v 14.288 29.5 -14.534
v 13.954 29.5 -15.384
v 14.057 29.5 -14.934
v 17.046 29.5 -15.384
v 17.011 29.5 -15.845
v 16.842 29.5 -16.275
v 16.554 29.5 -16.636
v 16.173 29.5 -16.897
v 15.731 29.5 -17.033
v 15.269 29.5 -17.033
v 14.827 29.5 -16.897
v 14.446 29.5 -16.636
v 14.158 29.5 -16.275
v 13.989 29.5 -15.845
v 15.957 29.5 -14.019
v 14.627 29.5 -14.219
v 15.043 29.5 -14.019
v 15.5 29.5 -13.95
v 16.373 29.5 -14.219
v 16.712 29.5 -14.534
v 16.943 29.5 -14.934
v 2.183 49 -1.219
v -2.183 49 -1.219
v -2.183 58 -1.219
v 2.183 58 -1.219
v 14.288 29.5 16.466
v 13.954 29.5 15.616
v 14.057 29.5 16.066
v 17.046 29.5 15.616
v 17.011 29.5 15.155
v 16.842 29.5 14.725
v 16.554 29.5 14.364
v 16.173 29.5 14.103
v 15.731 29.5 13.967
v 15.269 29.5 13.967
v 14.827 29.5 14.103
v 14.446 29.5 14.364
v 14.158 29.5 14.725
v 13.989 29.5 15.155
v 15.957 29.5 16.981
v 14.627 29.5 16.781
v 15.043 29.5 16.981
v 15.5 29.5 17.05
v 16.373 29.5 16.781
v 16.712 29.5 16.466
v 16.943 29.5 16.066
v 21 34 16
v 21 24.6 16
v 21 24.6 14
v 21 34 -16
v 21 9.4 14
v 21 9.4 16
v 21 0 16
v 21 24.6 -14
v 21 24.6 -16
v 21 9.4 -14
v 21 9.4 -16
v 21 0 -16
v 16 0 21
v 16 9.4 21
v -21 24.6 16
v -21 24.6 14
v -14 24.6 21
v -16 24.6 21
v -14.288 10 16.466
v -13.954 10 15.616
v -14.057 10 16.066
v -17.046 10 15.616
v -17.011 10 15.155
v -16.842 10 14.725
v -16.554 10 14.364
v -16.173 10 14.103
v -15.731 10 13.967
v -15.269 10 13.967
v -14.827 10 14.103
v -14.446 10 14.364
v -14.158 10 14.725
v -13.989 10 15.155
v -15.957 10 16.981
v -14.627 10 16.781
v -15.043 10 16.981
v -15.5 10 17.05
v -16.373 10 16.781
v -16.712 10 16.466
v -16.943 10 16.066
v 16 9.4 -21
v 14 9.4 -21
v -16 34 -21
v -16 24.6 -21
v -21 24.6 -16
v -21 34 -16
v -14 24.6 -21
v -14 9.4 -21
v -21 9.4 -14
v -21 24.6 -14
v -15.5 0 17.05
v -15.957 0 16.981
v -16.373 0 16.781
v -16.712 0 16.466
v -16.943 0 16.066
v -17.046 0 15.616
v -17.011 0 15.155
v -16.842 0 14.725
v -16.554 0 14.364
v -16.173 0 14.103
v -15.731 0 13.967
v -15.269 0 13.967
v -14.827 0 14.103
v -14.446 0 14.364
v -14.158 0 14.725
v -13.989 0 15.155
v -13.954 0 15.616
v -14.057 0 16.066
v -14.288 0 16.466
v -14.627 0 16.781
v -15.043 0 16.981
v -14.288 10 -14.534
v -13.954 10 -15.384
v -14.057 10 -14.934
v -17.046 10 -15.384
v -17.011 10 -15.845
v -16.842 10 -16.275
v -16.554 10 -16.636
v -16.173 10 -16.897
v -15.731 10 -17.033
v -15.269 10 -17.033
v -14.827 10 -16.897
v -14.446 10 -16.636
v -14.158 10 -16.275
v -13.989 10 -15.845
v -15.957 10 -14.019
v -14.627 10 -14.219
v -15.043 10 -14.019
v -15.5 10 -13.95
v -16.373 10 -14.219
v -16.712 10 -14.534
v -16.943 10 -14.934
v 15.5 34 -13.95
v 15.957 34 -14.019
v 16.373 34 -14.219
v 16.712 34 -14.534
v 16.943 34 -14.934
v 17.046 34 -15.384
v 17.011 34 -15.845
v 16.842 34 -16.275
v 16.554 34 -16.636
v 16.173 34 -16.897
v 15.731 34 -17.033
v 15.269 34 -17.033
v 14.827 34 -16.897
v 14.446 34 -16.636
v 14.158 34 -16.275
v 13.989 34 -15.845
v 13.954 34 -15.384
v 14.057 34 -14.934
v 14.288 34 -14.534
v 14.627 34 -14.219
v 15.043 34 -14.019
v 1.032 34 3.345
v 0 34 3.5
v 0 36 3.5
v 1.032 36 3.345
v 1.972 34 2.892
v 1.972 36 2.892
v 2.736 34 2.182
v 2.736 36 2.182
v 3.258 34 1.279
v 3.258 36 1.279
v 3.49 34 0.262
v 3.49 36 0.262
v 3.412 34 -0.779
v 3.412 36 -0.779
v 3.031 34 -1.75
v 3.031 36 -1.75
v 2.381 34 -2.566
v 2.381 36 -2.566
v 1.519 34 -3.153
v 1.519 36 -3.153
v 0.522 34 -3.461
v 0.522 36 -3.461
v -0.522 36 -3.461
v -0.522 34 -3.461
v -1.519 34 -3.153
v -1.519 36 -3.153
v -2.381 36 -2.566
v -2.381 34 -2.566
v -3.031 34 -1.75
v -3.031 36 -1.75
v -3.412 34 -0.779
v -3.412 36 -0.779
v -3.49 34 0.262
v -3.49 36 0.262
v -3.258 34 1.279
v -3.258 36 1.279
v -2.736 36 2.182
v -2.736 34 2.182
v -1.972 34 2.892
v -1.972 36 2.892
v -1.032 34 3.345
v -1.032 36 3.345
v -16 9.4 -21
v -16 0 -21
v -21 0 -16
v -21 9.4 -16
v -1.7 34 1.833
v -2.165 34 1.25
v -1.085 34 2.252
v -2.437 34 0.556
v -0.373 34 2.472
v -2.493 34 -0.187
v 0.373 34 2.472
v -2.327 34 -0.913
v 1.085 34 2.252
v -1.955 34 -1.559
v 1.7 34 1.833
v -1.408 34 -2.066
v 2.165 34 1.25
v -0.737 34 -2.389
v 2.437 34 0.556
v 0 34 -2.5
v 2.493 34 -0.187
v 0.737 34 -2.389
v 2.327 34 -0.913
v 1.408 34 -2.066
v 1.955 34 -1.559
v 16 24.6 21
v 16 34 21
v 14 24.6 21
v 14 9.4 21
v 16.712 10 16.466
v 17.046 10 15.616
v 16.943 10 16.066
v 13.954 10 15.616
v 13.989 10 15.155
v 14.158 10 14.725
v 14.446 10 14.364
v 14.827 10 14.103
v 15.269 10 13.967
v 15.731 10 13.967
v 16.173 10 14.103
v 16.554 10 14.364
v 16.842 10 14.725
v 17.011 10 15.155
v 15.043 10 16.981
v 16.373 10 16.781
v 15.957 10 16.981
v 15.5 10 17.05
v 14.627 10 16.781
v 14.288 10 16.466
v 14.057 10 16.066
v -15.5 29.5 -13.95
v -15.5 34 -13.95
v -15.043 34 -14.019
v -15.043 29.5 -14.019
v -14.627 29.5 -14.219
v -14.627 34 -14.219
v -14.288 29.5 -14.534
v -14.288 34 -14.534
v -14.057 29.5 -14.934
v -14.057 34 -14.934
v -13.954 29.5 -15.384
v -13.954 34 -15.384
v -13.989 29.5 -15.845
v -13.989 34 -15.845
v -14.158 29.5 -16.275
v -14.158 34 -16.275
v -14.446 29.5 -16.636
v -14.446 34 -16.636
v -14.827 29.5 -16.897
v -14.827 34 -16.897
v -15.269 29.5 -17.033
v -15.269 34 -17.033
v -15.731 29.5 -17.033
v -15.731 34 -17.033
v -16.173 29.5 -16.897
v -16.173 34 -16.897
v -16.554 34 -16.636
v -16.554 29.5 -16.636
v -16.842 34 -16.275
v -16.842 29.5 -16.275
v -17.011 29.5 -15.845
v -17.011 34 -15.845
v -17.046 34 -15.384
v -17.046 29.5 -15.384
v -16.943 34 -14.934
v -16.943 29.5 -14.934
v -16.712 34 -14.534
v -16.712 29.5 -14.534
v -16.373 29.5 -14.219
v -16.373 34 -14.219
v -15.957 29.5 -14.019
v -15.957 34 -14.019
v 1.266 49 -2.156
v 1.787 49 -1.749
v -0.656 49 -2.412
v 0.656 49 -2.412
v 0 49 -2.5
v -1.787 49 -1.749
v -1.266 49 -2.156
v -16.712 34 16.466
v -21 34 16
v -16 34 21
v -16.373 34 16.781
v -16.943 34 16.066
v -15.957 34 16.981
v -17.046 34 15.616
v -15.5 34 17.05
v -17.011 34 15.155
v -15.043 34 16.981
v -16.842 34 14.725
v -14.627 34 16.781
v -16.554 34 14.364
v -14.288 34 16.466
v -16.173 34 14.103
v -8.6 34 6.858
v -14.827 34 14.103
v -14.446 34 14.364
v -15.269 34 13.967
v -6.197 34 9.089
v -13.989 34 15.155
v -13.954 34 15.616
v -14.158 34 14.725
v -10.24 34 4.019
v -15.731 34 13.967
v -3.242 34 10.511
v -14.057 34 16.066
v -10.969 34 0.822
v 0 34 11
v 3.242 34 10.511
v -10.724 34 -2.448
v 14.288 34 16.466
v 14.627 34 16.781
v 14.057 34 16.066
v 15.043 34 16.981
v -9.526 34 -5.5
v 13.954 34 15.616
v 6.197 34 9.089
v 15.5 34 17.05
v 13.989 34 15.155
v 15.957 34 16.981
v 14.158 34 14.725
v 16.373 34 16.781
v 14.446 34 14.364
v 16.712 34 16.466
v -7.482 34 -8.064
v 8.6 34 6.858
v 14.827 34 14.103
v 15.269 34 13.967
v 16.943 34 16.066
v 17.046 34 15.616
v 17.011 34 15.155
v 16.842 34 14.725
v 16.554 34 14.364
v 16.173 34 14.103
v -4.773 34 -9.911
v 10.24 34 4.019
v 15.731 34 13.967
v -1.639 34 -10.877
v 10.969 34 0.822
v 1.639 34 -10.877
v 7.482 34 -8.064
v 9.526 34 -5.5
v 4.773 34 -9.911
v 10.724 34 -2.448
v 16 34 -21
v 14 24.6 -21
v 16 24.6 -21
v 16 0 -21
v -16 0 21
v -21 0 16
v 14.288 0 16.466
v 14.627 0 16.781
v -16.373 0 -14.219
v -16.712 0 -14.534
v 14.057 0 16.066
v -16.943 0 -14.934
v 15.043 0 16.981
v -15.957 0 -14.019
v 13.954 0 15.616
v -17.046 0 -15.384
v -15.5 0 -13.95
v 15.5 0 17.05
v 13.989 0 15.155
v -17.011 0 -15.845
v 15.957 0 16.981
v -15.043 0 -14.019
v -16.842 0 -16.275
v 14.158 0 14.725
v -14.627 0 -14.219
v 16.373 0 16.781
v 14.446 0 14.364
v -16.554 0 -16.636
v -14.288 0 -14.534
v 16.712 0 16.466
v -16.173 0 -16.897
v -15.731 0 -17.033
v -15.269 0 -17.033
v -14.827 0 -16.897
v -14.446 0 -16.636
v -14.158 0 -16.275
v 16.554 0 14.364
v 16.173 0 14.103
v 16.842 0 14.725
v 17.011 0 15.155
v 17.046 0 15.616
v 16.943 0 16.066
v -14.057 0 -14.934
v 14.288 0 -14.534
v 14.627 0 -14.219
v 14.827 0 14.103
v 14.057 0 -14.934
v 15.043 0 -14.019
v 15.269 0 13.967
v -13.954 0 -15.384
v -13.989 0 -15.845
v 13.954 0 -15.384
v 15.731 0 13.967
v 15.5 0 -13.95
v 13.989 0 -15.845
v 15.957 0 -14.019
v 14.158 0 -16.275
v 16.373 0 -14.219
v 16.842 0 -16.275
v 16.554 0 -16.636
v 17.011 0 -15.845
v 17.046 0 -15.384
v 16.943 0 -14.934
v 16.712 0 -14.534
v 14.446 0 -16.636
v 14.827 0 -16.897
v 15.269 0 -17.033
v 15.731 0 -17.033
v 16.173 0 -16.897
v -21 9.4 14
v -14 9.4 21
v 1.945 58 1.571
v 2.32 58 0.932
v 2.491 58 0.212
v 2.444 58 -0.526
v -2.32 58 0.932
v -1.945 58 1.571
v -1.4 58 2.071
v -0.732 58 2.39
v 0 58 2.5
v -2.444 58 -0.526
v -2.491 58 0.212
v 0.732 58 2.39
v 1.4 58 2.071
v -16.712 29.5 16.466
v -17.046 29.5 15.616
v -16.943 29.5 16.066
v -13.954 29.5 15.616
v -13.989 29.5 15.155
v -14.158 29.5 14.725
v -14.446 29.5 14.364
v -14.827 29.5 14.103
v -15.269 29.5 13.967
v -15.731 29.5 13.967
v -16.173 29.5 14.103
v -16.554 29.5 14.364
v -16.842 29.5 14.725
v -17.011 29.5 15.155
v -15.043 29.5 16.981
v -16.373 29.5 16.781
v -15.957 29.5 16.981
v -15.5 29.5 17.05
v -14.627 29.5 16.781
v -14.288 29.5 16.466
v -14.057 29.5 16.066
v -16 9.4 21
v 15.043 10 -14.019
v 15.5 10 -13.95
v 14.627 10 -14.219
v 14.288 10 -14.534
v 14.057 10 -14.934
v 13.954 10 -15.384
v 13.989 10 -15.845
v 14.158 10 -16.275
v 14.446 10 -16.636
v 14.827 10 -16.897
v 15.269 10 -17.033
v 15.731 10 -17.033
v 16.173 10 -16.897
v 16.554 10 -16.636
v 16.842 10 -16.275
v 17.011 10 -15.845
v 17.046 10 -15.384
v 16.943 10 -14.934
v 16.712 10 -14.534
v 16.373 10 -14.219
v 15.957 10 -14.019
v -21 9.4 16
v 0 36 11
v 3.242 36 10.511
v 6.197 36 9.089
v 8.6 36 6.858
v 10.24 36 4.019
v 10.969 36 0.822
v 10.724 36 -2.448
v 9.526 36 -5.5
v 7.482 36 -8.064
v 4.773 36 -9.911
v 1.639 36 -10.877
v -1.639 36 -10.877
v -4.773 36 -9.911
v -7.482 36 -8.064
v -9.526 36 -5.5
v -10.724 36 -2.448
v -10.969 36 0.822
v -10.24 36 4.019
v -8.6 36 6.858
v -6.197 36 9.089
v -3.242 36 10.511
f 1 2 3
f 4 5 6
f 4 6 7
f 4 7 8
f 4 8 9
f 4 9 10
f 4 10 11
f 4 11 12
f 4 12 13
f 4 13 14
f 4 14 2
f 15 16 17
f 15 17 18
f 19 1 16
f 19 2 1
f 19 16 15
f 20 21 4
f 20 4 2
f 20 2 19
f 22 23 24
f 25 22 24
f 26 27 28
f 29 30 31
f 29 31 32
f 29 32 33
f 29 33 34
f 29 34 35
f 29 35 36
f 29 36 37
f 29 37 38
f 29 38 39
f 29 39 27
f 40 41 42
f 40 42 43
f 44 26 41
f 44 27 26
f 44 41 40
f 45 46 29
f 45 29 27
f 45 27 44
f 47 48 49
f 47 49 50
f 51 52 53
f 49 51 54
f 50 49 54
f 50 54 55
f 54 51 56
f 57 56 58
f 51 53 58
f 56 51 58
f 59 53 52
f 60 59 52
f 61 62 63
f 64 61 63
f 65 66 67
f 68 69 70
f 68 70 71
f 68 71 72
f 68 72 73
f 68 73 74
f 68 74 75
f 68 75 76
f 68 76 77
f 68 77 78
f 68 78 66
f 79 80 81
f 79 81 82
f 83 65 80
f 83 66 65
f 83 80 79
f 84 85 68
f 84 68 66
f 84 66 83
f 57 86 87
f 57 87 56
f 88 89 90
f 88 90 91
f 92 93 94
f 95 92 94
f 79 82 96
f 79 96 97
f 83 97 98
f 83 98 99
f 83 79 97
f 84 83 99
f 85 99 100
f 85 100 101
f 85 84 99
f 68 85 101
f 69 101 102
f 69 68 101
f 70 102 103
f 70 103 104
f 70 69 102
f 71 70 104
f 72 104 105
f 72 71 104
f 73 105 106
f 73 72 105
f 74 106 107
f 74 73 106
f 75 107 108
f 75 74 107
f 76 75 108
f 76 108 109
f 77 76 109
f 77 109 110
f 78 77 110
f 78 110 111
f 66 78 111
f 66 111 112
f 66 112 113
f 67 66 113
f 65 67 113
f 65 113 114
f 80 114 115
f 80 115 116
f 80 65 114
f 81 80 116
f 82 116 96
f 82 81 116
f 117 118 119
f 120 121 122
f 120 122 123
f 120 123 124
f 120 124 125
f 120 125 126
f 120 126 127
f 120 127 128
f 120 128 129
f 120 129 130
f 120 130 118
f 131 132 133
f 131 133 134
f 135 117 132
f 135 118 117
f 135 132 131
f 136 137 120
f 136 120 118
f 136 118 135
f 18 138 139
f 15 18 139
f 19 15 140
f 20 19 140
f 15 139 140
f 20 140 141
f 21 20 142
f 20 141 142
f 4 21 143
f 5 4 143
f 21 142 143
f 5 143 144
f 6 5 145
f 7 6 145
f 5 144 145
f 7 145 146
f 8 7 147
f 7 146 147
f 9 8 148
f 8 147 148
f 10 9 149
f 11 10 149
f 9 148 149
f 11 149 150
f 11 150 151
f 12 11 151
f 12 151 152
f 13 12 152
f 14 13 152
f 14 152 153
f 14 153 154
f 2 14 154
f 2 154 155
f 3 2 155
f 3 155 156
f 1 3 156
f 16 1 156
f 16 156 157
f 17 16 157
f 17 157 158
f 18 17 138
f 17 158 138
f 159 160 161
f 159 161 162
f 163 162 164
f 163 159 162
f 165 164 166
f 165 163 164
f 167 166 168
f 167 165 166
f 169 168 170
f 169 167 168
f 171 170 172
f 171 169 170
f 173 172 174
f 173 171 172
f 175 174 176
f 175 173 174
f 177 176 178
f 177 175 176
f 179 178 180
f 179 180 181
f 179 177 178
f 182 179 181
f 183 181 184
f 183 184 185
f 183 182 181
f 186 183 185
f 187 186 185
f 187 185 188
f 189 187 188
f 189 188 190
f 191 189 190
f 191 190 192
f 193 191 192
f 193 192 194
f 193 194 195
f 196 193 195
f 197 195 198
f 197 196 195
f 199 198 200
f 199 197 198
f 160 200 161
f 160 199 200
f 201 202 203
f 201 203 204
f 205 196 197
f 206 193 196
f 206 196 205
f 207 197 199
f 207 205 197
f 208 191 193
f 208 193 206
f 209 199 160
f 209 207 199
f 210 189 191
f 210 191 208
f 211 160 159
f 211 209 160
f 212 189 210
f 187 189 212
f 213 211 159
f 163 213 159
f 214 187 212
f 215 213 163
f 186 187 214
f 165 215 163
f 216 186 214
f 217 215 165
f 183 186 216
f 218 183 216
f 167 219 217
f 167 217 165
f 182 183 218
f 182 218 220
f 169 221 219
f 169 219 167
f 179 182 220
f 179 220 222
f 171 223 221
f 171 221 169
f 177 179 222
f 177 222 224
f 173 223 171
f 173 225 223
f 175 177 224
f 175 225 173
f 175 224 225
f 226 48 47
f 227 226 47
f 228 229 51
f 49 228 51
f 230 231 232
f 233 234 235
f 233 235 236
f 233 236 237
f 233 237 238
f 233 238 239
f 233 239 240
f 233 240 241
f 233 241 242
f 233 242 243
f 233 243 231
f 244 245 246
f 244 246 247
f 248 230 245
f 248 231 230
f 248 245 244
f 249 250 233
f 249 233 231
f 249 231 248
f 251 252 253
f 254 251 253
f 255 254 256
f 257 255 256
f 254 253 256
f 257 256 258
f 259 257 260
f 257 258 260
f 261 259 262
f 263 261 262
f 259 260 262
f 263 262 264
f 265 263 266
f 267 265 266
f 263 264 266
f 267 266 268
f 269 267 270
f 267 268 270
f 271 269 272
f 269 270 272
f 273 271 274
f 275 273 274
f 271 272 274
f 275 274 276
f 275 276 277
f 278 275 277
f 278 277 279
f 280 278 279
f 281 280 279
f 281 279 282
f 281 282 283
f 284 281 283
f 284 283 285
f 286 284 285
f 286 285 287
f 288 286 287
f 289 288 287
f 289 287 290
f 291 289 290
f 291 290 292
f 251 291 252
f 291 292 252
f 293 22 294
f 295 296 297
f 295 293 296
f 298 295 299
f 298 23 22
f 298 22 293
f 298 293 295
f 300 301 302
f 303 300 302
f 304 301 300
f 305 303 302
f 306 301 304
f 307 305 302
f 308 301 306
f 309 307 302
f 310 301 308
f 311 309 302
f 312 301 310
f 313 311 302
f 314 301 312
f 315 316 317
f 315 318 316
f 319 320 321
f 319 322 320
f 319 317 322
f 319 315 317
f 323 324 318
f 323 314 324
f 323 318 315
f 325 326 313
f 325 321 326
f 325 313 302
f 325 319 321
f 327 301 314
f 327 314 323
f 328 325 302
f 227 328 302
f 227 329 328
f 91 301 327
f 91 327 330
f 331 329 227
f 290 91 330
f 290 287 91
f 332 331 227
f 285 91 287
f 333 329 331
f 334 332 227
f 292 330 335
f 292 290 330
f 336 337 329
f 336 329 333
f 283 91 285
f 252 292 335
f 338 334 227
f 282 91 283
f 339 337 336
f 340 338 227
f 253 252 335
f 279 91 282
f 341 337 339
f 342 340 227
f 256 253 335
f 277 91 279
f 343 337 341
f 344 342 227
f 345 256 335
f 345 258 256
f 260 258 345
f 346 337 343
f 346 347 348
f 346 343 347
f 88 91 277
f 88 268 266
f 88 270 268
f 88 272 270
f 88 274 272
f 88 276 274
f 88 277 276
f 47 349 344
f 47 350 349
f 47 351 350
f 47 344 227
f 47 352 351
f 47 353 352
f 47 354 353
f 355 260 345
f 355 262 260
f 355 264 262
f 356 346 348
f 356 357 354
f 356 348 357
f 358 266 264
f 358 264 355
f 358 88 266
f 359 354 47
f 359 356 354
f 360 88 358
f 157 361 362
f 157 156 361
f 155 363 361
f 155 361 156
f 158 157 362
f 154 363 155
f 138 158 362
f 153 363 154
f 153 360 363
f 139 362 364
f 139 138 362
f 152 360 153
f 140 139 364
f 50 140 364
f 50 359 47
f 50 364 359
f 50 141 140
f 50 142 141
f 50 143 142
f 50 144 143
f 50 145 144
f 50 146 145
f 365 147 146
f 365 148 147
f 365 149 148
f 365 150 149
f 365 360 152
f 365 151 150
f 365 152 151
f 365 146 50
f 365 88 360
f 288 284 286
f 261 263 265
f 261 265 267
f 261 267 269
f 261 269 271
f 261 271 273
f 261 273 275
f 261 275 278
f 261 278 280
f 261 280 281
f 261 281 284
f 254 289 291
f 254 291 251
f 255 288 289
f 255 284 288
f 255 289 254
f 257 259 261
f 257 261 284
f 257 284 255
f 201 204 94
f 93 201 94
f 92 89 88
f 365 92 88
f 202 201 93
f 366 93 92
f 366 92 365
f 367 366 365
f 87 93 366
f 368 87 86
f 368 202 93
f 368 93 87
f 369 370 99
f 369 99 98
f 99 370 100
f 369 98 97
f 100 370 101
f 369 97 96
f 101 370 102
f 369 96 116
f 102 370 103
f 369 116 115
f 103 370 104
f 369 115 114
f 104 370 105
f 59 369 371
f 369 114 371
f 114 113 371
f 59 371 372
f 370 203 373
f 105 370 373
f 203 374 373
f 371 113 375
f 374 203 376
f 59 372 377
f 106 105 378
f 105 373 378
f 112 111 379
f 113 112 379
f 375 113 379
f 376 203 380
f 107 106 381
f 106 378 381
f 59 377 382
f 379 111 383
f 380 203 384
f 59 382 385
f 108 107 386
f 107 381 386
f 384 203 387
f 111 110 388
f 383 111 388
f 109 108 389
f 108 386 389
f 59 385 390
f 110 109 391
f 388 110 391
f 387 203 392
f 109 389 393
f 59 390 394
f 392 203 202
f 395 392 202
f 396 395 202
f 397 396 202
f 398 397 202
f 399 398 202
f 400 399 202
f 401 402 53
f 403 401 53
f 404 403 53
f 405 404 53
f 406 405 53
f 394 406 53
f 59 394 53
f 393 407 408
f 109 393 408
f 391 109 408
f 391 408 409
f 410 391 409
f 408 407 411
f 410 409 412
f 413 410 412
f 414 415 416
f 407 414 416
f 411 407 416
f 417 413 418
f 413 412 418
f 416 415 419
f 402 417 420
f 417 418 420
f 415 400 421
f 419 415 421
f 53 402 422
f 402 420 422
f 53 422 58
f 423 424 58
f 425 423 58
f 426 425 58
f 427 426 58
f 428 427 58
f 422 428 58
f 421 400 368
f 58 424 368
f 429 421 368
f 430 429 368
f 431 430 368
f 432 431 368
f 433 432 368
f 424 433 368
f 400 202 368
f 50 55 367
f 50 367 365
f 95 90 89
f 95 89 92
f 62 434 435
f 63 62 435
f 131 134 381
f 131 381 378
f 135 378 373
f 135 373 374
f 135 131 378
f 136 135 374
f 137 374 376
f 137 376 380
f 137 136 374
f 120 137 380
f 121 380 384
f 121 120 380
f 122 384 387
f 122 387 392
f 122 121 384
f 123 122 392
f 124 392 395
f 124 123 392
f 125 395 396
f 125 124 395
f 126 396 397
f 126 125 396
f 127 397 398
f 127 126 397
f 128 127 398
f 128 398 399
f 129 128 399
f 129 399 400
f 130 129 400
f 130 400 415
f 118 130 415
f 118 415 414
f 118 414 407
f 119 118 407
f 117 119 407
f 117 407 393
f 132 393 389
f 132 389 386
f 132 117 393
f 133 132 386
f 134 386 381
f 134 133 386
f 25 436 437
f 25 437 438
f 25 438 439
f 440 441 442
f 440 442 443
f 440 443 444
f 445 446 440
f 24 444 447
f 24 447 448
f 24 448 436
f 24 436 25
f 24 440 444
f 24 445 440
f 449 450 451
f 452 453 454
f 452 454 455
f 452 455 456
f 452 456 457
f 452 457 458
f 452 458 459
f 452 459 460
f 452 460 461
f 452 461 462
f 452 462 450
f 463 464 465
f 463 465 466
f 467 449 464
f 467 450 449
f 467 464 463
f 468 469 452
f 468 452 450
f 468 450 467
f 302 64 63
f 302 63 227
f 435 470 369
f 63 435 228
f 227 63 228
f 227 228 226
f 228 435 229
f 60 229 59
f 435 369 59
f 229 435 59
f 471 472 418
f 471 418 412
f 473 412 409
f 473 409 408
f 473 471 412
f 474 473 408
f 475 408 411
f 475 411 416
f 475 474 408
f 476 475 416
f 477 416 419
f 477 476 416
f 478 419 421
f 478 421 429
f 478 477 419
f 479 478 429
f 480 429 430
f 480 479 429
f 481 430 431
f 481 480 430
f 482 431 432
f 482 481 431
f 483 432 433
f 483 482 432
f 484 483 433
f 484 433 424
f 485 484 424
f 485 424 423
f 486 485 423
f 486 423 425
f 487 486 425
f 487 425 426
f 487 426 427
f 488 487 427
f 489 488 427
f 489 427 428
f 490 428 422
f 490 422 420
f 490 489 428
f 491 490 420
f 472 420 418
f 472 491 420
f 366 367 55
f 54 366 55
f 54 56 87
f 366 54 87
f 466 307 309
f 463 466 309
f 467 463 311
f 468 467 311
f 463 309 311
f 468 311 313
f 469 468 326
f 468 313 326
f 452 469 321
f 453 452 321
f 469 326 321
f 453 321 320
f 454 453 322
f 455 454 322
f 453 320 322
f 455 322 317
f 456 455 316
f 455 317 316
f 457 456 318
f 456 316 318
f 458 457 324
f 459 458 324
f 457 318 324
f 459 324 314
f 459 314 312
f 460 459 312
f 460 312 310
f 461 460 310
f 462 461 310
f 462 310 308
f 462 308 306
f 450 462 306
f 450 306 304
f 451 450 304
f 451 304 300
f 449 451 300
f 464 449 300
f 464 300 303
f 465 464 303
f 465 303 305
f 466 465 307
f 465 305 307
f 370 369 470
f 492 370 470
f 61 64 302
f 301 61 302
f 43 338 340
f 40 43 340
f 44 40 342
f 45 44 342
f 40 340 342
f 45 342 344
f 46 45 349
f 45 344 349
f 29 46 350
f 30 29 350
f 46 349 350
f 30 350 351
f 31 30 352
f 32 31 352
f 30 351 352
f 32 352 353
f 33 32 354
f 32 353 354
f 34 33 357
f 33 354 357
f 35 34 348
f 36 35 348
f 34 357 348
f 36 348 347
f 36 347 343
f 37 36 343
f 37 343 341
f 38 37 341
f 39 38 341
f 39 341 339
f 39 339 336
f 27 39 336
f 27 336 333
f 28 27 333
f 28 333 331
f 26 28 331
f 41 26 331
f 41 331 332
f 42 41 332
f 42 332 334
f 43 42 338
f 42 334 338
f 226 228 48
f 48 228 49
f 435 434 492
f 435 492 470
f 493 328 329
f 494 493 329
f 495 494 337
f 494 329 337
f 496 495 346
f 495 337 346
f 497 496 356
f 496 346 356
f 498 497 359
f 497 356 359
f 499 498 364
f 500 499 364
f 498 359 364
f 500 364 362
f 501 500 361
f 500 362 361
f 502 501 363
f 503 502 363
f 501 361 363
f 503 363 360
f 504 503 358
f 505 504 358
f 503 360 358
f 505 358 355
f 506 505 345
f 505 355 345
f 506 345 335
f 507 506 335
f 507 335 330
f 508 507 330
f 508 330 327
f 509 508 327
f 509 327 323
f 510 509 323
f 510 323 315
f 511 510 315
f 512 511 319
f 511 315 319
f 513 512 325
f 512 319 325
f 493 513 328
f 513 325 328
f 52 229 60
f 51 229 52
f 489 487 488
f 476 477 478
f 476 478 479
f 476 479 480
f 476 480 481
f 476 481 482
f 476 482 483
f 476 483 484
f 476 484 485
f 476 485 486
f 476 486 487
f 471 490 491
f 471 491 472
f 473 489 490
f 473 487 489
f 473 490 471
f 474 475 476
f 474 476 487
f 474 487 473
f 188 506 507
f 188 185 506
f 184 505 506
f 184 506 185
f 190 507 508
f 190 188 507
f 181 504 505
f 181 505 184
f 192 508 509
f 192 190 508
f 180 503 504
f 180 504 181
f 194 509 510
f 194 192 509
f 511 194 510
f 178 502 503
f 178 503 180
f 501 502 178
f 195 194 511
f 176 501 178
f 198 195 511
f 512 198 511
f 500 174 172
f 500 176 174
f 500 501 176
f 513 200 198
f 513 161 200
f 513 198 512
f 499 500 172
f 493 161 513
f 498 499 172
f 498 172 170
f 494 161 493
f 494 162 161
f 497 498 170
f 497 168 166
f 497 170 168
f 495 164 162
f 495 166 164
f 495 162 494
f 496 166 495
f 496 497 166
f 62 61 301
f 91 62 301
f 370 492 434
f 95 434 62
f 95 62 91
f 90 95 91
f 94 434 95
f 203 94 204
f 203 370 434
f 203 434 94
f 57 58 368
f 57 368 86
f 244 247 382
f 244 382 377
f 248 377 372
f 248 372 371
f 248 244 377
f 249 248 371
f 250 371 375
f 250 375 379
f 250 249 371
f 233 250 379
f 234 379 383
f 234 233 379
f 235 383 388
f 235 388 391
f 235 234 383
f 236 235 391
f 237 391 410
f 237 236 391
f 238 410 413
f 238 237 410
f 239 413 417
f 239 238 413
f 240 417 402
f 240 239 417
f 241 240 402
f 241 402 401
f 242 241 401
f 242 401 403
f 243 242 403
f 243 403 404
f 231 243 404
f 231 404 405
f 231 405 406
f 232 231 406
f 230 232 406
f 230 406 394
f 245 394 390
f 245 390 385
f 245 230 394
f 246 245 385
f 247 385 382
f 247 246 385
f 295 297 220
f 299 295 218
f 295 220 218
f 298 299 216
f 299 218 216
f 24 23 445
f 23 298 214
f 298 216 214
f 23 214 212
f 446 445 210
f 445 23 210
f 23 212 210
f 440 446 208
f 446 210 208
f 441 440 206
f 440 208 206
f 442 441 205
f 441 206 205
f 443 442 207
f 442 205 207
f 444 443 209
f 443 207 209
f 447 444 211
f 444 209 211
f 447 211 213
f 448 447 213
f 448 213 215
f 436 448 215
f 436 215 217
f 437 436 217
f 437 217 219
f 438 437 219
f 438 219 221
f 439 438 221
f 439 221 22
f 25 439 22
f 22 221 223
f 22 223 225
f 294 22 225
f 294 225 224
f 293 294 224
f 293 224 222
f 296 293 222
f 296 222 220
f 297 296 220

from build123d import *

# Parameters (mm, degrees)
SKETCH4_W               = 42
SKETCH4_H               = 42
BOTTOM_DEPTH            = 9.4
MIDDLE_DEPTH            = 15.2
SKETCH8_W               = 42
SKETCH8_H               = 42
TOP_DEPTH               = 9.4
CHAMFER1_SIZE           = 5
SKETCH9_R               = 11
SKETCH9_R_2             = 3.5
RING_DEPTH              = 2
SKETCH10_R              = 2.5
SHAFT_DEPTH             = 24
CUT_EXTRUDE3_DEPTH      = 5
CUT_EXTRUDE3_DEPTH_BACK = 5
SKETCH11_W              = 2.239647547
SKETCH11_H              = 24.242457261
SKETCH12_R              = 1.55
CUT_EXTRUDE4_DEPTH      = 4.5
CUT_EXTRUDE5_START      = -10
SKETCH15_R              = 1.55
CUT_EXTRUDE5_DEPTH      = 10


with BuildPart() as part:
    # Sketch4 → Bottom (new body)
    with BuildSketch(Plane(origin=(0, 0, 0), x_dir=(1, 0, 0), z_dir=(0, 1, 0))):
        Rectangle(SKETCH4_W, SKETCH4_H)
    extrude(amount=BOTTOM_DEPTH)

    # Sketch6 → Middle (add)
    with BuildSketch(Plane(origin=(0, 9.4, 0), x_dir=(1, 0, 0), z_dir=(0, 1, 0))):
        Polygon((-21, -14), (-14, -21), (14, -21), (21, -14), (21, 14), (14, 21), (-14, 21), (-21, 14), align=None)
    extrude(amount=MIDDLE_DEPTH)

    # Sketch8 → Top (add)
    with BuildSketch(Plane(origin=(0, 24.6, 0), x_dir=(1, 0, 0), z_dir=(0, 1, 0))):
        Rectangle(SKETCH8_W, SKETCH8_H)
    extrude(amount=TOP_DEPTH)

    # Chamfer1
    chamfer1_edges = [part.edges().sort_by_distance(p)[0] for p in [
        (21, 29.3, 21),
        (21, 29.3, -21),
        (-21, 29.3, -21),
        (-21, 29.3, 21),
        (-21, 4.7, 21),
        (-21, 4.7, -21),
        (21, 4.7, -21),
        (21, 4.7, 21),
    ]]
    chamfer(chamfer1_edges, length=CHAMFER1_SIZE)

    # Sketch9 → Ring (add)
    with BuildSketch(Plane(origin=(0, 34, 0), x_dir=(1, 0, 0), z_dir=(0, 1, 0))):
        with Locations(Location((0, 0, 0), (0, 0, 270))):
            Circle(SKETCH9_R)
        with Locations(Location((0, 0, 0), (0, 0, 270))):
            Circle(SKETCH9_R_2, mode=Mode.SUBTRACT)
    extrude(amount=RING_DEPTH)

    # Sketch10 → Shaft (add)
    with BuildSketch(Plane(origin=(0, 34, 0), x_dir=(1, 0, 0), z_dir=(0, 1, 0))):
        with Locations(Location((0, 0, 0), (0, 0, 90))):
            Circle(SKETCH10_R)
    extrude(amount=SHAFT_DEPTH)

    # Sketch11 → Cut-Extrude3 (cut, two sides: drawn at the far end of the back side and taken through both)
    with BuildSketch(Plane(origin=(0, 0, 0), x_dir=(0, 0, -1), z_dir=(1, 0, 0)).offset(-CUT_EXTRUDE3_DEPTH_BACK)):
        with Locations((2.338622492, 61.12122863)):
            Rectangle(SKETCH11_W, SKETCH11_H)
    extrude(amount=CUT_EXTRUDE3_DEPTH + CUT_EXTRUDE3_DEPTH_BACK, mode=Mode.SUBTRACT)

    # Sketch12 → Cut-Extrude4 (cut)
    with BuildSketch(Plane(origin=(0, 34, 0), x_dir=(1, 0, 0), z_dir=(0, 1, 0))):
        with Locations(Location((15.5, -15.5, 0), (0, 0, 270))):
            Circle(SKETCH12_R)
        with Locations(Location((-15.5, -15.5, 0), (0, 0, 270))):
            Circle(SKETCH12_R)
        with Locations(Location((-15.5, 15.5, 0), (0, 0, 270))):
            Circle(SKETCH12_R)
        with Locations(Location((15.5, 15.5, 0), (0, 0, 270))):
            Circle(SKETCH12_R)
    extrude(amount=-CUT_EXTRUDE4_DEPTH, mode=Mode.SUBTRACT)

    # Sketch15 → Cut-Extrude5 (cut)
    with BuildSketch(Plane.XZ.offset(CUT_EXTRUDE5_START)):
        with Locations(Location((15.5, 15.5, 0), (0, 0, 90))):
            Circle(SKETCH15_R)
        with Locations(Location((15.5, -15.5, 0), (0, 0, 90))):
            Circle(SKETCH15_R)
        with Locations(Location((-15.5, 15.5, 0), (0, 0, 90))):
            Circle(SKETCH15_R)
        with Locations(Location((-15.5, -15.5, 0), (0, 0, 90))):
            Circle(SKETCH15_R)
    extrude(amount=CUT_EXTRUDE5_DEPTH, mode=Mode.SUBTRACT)


solid = part.part
